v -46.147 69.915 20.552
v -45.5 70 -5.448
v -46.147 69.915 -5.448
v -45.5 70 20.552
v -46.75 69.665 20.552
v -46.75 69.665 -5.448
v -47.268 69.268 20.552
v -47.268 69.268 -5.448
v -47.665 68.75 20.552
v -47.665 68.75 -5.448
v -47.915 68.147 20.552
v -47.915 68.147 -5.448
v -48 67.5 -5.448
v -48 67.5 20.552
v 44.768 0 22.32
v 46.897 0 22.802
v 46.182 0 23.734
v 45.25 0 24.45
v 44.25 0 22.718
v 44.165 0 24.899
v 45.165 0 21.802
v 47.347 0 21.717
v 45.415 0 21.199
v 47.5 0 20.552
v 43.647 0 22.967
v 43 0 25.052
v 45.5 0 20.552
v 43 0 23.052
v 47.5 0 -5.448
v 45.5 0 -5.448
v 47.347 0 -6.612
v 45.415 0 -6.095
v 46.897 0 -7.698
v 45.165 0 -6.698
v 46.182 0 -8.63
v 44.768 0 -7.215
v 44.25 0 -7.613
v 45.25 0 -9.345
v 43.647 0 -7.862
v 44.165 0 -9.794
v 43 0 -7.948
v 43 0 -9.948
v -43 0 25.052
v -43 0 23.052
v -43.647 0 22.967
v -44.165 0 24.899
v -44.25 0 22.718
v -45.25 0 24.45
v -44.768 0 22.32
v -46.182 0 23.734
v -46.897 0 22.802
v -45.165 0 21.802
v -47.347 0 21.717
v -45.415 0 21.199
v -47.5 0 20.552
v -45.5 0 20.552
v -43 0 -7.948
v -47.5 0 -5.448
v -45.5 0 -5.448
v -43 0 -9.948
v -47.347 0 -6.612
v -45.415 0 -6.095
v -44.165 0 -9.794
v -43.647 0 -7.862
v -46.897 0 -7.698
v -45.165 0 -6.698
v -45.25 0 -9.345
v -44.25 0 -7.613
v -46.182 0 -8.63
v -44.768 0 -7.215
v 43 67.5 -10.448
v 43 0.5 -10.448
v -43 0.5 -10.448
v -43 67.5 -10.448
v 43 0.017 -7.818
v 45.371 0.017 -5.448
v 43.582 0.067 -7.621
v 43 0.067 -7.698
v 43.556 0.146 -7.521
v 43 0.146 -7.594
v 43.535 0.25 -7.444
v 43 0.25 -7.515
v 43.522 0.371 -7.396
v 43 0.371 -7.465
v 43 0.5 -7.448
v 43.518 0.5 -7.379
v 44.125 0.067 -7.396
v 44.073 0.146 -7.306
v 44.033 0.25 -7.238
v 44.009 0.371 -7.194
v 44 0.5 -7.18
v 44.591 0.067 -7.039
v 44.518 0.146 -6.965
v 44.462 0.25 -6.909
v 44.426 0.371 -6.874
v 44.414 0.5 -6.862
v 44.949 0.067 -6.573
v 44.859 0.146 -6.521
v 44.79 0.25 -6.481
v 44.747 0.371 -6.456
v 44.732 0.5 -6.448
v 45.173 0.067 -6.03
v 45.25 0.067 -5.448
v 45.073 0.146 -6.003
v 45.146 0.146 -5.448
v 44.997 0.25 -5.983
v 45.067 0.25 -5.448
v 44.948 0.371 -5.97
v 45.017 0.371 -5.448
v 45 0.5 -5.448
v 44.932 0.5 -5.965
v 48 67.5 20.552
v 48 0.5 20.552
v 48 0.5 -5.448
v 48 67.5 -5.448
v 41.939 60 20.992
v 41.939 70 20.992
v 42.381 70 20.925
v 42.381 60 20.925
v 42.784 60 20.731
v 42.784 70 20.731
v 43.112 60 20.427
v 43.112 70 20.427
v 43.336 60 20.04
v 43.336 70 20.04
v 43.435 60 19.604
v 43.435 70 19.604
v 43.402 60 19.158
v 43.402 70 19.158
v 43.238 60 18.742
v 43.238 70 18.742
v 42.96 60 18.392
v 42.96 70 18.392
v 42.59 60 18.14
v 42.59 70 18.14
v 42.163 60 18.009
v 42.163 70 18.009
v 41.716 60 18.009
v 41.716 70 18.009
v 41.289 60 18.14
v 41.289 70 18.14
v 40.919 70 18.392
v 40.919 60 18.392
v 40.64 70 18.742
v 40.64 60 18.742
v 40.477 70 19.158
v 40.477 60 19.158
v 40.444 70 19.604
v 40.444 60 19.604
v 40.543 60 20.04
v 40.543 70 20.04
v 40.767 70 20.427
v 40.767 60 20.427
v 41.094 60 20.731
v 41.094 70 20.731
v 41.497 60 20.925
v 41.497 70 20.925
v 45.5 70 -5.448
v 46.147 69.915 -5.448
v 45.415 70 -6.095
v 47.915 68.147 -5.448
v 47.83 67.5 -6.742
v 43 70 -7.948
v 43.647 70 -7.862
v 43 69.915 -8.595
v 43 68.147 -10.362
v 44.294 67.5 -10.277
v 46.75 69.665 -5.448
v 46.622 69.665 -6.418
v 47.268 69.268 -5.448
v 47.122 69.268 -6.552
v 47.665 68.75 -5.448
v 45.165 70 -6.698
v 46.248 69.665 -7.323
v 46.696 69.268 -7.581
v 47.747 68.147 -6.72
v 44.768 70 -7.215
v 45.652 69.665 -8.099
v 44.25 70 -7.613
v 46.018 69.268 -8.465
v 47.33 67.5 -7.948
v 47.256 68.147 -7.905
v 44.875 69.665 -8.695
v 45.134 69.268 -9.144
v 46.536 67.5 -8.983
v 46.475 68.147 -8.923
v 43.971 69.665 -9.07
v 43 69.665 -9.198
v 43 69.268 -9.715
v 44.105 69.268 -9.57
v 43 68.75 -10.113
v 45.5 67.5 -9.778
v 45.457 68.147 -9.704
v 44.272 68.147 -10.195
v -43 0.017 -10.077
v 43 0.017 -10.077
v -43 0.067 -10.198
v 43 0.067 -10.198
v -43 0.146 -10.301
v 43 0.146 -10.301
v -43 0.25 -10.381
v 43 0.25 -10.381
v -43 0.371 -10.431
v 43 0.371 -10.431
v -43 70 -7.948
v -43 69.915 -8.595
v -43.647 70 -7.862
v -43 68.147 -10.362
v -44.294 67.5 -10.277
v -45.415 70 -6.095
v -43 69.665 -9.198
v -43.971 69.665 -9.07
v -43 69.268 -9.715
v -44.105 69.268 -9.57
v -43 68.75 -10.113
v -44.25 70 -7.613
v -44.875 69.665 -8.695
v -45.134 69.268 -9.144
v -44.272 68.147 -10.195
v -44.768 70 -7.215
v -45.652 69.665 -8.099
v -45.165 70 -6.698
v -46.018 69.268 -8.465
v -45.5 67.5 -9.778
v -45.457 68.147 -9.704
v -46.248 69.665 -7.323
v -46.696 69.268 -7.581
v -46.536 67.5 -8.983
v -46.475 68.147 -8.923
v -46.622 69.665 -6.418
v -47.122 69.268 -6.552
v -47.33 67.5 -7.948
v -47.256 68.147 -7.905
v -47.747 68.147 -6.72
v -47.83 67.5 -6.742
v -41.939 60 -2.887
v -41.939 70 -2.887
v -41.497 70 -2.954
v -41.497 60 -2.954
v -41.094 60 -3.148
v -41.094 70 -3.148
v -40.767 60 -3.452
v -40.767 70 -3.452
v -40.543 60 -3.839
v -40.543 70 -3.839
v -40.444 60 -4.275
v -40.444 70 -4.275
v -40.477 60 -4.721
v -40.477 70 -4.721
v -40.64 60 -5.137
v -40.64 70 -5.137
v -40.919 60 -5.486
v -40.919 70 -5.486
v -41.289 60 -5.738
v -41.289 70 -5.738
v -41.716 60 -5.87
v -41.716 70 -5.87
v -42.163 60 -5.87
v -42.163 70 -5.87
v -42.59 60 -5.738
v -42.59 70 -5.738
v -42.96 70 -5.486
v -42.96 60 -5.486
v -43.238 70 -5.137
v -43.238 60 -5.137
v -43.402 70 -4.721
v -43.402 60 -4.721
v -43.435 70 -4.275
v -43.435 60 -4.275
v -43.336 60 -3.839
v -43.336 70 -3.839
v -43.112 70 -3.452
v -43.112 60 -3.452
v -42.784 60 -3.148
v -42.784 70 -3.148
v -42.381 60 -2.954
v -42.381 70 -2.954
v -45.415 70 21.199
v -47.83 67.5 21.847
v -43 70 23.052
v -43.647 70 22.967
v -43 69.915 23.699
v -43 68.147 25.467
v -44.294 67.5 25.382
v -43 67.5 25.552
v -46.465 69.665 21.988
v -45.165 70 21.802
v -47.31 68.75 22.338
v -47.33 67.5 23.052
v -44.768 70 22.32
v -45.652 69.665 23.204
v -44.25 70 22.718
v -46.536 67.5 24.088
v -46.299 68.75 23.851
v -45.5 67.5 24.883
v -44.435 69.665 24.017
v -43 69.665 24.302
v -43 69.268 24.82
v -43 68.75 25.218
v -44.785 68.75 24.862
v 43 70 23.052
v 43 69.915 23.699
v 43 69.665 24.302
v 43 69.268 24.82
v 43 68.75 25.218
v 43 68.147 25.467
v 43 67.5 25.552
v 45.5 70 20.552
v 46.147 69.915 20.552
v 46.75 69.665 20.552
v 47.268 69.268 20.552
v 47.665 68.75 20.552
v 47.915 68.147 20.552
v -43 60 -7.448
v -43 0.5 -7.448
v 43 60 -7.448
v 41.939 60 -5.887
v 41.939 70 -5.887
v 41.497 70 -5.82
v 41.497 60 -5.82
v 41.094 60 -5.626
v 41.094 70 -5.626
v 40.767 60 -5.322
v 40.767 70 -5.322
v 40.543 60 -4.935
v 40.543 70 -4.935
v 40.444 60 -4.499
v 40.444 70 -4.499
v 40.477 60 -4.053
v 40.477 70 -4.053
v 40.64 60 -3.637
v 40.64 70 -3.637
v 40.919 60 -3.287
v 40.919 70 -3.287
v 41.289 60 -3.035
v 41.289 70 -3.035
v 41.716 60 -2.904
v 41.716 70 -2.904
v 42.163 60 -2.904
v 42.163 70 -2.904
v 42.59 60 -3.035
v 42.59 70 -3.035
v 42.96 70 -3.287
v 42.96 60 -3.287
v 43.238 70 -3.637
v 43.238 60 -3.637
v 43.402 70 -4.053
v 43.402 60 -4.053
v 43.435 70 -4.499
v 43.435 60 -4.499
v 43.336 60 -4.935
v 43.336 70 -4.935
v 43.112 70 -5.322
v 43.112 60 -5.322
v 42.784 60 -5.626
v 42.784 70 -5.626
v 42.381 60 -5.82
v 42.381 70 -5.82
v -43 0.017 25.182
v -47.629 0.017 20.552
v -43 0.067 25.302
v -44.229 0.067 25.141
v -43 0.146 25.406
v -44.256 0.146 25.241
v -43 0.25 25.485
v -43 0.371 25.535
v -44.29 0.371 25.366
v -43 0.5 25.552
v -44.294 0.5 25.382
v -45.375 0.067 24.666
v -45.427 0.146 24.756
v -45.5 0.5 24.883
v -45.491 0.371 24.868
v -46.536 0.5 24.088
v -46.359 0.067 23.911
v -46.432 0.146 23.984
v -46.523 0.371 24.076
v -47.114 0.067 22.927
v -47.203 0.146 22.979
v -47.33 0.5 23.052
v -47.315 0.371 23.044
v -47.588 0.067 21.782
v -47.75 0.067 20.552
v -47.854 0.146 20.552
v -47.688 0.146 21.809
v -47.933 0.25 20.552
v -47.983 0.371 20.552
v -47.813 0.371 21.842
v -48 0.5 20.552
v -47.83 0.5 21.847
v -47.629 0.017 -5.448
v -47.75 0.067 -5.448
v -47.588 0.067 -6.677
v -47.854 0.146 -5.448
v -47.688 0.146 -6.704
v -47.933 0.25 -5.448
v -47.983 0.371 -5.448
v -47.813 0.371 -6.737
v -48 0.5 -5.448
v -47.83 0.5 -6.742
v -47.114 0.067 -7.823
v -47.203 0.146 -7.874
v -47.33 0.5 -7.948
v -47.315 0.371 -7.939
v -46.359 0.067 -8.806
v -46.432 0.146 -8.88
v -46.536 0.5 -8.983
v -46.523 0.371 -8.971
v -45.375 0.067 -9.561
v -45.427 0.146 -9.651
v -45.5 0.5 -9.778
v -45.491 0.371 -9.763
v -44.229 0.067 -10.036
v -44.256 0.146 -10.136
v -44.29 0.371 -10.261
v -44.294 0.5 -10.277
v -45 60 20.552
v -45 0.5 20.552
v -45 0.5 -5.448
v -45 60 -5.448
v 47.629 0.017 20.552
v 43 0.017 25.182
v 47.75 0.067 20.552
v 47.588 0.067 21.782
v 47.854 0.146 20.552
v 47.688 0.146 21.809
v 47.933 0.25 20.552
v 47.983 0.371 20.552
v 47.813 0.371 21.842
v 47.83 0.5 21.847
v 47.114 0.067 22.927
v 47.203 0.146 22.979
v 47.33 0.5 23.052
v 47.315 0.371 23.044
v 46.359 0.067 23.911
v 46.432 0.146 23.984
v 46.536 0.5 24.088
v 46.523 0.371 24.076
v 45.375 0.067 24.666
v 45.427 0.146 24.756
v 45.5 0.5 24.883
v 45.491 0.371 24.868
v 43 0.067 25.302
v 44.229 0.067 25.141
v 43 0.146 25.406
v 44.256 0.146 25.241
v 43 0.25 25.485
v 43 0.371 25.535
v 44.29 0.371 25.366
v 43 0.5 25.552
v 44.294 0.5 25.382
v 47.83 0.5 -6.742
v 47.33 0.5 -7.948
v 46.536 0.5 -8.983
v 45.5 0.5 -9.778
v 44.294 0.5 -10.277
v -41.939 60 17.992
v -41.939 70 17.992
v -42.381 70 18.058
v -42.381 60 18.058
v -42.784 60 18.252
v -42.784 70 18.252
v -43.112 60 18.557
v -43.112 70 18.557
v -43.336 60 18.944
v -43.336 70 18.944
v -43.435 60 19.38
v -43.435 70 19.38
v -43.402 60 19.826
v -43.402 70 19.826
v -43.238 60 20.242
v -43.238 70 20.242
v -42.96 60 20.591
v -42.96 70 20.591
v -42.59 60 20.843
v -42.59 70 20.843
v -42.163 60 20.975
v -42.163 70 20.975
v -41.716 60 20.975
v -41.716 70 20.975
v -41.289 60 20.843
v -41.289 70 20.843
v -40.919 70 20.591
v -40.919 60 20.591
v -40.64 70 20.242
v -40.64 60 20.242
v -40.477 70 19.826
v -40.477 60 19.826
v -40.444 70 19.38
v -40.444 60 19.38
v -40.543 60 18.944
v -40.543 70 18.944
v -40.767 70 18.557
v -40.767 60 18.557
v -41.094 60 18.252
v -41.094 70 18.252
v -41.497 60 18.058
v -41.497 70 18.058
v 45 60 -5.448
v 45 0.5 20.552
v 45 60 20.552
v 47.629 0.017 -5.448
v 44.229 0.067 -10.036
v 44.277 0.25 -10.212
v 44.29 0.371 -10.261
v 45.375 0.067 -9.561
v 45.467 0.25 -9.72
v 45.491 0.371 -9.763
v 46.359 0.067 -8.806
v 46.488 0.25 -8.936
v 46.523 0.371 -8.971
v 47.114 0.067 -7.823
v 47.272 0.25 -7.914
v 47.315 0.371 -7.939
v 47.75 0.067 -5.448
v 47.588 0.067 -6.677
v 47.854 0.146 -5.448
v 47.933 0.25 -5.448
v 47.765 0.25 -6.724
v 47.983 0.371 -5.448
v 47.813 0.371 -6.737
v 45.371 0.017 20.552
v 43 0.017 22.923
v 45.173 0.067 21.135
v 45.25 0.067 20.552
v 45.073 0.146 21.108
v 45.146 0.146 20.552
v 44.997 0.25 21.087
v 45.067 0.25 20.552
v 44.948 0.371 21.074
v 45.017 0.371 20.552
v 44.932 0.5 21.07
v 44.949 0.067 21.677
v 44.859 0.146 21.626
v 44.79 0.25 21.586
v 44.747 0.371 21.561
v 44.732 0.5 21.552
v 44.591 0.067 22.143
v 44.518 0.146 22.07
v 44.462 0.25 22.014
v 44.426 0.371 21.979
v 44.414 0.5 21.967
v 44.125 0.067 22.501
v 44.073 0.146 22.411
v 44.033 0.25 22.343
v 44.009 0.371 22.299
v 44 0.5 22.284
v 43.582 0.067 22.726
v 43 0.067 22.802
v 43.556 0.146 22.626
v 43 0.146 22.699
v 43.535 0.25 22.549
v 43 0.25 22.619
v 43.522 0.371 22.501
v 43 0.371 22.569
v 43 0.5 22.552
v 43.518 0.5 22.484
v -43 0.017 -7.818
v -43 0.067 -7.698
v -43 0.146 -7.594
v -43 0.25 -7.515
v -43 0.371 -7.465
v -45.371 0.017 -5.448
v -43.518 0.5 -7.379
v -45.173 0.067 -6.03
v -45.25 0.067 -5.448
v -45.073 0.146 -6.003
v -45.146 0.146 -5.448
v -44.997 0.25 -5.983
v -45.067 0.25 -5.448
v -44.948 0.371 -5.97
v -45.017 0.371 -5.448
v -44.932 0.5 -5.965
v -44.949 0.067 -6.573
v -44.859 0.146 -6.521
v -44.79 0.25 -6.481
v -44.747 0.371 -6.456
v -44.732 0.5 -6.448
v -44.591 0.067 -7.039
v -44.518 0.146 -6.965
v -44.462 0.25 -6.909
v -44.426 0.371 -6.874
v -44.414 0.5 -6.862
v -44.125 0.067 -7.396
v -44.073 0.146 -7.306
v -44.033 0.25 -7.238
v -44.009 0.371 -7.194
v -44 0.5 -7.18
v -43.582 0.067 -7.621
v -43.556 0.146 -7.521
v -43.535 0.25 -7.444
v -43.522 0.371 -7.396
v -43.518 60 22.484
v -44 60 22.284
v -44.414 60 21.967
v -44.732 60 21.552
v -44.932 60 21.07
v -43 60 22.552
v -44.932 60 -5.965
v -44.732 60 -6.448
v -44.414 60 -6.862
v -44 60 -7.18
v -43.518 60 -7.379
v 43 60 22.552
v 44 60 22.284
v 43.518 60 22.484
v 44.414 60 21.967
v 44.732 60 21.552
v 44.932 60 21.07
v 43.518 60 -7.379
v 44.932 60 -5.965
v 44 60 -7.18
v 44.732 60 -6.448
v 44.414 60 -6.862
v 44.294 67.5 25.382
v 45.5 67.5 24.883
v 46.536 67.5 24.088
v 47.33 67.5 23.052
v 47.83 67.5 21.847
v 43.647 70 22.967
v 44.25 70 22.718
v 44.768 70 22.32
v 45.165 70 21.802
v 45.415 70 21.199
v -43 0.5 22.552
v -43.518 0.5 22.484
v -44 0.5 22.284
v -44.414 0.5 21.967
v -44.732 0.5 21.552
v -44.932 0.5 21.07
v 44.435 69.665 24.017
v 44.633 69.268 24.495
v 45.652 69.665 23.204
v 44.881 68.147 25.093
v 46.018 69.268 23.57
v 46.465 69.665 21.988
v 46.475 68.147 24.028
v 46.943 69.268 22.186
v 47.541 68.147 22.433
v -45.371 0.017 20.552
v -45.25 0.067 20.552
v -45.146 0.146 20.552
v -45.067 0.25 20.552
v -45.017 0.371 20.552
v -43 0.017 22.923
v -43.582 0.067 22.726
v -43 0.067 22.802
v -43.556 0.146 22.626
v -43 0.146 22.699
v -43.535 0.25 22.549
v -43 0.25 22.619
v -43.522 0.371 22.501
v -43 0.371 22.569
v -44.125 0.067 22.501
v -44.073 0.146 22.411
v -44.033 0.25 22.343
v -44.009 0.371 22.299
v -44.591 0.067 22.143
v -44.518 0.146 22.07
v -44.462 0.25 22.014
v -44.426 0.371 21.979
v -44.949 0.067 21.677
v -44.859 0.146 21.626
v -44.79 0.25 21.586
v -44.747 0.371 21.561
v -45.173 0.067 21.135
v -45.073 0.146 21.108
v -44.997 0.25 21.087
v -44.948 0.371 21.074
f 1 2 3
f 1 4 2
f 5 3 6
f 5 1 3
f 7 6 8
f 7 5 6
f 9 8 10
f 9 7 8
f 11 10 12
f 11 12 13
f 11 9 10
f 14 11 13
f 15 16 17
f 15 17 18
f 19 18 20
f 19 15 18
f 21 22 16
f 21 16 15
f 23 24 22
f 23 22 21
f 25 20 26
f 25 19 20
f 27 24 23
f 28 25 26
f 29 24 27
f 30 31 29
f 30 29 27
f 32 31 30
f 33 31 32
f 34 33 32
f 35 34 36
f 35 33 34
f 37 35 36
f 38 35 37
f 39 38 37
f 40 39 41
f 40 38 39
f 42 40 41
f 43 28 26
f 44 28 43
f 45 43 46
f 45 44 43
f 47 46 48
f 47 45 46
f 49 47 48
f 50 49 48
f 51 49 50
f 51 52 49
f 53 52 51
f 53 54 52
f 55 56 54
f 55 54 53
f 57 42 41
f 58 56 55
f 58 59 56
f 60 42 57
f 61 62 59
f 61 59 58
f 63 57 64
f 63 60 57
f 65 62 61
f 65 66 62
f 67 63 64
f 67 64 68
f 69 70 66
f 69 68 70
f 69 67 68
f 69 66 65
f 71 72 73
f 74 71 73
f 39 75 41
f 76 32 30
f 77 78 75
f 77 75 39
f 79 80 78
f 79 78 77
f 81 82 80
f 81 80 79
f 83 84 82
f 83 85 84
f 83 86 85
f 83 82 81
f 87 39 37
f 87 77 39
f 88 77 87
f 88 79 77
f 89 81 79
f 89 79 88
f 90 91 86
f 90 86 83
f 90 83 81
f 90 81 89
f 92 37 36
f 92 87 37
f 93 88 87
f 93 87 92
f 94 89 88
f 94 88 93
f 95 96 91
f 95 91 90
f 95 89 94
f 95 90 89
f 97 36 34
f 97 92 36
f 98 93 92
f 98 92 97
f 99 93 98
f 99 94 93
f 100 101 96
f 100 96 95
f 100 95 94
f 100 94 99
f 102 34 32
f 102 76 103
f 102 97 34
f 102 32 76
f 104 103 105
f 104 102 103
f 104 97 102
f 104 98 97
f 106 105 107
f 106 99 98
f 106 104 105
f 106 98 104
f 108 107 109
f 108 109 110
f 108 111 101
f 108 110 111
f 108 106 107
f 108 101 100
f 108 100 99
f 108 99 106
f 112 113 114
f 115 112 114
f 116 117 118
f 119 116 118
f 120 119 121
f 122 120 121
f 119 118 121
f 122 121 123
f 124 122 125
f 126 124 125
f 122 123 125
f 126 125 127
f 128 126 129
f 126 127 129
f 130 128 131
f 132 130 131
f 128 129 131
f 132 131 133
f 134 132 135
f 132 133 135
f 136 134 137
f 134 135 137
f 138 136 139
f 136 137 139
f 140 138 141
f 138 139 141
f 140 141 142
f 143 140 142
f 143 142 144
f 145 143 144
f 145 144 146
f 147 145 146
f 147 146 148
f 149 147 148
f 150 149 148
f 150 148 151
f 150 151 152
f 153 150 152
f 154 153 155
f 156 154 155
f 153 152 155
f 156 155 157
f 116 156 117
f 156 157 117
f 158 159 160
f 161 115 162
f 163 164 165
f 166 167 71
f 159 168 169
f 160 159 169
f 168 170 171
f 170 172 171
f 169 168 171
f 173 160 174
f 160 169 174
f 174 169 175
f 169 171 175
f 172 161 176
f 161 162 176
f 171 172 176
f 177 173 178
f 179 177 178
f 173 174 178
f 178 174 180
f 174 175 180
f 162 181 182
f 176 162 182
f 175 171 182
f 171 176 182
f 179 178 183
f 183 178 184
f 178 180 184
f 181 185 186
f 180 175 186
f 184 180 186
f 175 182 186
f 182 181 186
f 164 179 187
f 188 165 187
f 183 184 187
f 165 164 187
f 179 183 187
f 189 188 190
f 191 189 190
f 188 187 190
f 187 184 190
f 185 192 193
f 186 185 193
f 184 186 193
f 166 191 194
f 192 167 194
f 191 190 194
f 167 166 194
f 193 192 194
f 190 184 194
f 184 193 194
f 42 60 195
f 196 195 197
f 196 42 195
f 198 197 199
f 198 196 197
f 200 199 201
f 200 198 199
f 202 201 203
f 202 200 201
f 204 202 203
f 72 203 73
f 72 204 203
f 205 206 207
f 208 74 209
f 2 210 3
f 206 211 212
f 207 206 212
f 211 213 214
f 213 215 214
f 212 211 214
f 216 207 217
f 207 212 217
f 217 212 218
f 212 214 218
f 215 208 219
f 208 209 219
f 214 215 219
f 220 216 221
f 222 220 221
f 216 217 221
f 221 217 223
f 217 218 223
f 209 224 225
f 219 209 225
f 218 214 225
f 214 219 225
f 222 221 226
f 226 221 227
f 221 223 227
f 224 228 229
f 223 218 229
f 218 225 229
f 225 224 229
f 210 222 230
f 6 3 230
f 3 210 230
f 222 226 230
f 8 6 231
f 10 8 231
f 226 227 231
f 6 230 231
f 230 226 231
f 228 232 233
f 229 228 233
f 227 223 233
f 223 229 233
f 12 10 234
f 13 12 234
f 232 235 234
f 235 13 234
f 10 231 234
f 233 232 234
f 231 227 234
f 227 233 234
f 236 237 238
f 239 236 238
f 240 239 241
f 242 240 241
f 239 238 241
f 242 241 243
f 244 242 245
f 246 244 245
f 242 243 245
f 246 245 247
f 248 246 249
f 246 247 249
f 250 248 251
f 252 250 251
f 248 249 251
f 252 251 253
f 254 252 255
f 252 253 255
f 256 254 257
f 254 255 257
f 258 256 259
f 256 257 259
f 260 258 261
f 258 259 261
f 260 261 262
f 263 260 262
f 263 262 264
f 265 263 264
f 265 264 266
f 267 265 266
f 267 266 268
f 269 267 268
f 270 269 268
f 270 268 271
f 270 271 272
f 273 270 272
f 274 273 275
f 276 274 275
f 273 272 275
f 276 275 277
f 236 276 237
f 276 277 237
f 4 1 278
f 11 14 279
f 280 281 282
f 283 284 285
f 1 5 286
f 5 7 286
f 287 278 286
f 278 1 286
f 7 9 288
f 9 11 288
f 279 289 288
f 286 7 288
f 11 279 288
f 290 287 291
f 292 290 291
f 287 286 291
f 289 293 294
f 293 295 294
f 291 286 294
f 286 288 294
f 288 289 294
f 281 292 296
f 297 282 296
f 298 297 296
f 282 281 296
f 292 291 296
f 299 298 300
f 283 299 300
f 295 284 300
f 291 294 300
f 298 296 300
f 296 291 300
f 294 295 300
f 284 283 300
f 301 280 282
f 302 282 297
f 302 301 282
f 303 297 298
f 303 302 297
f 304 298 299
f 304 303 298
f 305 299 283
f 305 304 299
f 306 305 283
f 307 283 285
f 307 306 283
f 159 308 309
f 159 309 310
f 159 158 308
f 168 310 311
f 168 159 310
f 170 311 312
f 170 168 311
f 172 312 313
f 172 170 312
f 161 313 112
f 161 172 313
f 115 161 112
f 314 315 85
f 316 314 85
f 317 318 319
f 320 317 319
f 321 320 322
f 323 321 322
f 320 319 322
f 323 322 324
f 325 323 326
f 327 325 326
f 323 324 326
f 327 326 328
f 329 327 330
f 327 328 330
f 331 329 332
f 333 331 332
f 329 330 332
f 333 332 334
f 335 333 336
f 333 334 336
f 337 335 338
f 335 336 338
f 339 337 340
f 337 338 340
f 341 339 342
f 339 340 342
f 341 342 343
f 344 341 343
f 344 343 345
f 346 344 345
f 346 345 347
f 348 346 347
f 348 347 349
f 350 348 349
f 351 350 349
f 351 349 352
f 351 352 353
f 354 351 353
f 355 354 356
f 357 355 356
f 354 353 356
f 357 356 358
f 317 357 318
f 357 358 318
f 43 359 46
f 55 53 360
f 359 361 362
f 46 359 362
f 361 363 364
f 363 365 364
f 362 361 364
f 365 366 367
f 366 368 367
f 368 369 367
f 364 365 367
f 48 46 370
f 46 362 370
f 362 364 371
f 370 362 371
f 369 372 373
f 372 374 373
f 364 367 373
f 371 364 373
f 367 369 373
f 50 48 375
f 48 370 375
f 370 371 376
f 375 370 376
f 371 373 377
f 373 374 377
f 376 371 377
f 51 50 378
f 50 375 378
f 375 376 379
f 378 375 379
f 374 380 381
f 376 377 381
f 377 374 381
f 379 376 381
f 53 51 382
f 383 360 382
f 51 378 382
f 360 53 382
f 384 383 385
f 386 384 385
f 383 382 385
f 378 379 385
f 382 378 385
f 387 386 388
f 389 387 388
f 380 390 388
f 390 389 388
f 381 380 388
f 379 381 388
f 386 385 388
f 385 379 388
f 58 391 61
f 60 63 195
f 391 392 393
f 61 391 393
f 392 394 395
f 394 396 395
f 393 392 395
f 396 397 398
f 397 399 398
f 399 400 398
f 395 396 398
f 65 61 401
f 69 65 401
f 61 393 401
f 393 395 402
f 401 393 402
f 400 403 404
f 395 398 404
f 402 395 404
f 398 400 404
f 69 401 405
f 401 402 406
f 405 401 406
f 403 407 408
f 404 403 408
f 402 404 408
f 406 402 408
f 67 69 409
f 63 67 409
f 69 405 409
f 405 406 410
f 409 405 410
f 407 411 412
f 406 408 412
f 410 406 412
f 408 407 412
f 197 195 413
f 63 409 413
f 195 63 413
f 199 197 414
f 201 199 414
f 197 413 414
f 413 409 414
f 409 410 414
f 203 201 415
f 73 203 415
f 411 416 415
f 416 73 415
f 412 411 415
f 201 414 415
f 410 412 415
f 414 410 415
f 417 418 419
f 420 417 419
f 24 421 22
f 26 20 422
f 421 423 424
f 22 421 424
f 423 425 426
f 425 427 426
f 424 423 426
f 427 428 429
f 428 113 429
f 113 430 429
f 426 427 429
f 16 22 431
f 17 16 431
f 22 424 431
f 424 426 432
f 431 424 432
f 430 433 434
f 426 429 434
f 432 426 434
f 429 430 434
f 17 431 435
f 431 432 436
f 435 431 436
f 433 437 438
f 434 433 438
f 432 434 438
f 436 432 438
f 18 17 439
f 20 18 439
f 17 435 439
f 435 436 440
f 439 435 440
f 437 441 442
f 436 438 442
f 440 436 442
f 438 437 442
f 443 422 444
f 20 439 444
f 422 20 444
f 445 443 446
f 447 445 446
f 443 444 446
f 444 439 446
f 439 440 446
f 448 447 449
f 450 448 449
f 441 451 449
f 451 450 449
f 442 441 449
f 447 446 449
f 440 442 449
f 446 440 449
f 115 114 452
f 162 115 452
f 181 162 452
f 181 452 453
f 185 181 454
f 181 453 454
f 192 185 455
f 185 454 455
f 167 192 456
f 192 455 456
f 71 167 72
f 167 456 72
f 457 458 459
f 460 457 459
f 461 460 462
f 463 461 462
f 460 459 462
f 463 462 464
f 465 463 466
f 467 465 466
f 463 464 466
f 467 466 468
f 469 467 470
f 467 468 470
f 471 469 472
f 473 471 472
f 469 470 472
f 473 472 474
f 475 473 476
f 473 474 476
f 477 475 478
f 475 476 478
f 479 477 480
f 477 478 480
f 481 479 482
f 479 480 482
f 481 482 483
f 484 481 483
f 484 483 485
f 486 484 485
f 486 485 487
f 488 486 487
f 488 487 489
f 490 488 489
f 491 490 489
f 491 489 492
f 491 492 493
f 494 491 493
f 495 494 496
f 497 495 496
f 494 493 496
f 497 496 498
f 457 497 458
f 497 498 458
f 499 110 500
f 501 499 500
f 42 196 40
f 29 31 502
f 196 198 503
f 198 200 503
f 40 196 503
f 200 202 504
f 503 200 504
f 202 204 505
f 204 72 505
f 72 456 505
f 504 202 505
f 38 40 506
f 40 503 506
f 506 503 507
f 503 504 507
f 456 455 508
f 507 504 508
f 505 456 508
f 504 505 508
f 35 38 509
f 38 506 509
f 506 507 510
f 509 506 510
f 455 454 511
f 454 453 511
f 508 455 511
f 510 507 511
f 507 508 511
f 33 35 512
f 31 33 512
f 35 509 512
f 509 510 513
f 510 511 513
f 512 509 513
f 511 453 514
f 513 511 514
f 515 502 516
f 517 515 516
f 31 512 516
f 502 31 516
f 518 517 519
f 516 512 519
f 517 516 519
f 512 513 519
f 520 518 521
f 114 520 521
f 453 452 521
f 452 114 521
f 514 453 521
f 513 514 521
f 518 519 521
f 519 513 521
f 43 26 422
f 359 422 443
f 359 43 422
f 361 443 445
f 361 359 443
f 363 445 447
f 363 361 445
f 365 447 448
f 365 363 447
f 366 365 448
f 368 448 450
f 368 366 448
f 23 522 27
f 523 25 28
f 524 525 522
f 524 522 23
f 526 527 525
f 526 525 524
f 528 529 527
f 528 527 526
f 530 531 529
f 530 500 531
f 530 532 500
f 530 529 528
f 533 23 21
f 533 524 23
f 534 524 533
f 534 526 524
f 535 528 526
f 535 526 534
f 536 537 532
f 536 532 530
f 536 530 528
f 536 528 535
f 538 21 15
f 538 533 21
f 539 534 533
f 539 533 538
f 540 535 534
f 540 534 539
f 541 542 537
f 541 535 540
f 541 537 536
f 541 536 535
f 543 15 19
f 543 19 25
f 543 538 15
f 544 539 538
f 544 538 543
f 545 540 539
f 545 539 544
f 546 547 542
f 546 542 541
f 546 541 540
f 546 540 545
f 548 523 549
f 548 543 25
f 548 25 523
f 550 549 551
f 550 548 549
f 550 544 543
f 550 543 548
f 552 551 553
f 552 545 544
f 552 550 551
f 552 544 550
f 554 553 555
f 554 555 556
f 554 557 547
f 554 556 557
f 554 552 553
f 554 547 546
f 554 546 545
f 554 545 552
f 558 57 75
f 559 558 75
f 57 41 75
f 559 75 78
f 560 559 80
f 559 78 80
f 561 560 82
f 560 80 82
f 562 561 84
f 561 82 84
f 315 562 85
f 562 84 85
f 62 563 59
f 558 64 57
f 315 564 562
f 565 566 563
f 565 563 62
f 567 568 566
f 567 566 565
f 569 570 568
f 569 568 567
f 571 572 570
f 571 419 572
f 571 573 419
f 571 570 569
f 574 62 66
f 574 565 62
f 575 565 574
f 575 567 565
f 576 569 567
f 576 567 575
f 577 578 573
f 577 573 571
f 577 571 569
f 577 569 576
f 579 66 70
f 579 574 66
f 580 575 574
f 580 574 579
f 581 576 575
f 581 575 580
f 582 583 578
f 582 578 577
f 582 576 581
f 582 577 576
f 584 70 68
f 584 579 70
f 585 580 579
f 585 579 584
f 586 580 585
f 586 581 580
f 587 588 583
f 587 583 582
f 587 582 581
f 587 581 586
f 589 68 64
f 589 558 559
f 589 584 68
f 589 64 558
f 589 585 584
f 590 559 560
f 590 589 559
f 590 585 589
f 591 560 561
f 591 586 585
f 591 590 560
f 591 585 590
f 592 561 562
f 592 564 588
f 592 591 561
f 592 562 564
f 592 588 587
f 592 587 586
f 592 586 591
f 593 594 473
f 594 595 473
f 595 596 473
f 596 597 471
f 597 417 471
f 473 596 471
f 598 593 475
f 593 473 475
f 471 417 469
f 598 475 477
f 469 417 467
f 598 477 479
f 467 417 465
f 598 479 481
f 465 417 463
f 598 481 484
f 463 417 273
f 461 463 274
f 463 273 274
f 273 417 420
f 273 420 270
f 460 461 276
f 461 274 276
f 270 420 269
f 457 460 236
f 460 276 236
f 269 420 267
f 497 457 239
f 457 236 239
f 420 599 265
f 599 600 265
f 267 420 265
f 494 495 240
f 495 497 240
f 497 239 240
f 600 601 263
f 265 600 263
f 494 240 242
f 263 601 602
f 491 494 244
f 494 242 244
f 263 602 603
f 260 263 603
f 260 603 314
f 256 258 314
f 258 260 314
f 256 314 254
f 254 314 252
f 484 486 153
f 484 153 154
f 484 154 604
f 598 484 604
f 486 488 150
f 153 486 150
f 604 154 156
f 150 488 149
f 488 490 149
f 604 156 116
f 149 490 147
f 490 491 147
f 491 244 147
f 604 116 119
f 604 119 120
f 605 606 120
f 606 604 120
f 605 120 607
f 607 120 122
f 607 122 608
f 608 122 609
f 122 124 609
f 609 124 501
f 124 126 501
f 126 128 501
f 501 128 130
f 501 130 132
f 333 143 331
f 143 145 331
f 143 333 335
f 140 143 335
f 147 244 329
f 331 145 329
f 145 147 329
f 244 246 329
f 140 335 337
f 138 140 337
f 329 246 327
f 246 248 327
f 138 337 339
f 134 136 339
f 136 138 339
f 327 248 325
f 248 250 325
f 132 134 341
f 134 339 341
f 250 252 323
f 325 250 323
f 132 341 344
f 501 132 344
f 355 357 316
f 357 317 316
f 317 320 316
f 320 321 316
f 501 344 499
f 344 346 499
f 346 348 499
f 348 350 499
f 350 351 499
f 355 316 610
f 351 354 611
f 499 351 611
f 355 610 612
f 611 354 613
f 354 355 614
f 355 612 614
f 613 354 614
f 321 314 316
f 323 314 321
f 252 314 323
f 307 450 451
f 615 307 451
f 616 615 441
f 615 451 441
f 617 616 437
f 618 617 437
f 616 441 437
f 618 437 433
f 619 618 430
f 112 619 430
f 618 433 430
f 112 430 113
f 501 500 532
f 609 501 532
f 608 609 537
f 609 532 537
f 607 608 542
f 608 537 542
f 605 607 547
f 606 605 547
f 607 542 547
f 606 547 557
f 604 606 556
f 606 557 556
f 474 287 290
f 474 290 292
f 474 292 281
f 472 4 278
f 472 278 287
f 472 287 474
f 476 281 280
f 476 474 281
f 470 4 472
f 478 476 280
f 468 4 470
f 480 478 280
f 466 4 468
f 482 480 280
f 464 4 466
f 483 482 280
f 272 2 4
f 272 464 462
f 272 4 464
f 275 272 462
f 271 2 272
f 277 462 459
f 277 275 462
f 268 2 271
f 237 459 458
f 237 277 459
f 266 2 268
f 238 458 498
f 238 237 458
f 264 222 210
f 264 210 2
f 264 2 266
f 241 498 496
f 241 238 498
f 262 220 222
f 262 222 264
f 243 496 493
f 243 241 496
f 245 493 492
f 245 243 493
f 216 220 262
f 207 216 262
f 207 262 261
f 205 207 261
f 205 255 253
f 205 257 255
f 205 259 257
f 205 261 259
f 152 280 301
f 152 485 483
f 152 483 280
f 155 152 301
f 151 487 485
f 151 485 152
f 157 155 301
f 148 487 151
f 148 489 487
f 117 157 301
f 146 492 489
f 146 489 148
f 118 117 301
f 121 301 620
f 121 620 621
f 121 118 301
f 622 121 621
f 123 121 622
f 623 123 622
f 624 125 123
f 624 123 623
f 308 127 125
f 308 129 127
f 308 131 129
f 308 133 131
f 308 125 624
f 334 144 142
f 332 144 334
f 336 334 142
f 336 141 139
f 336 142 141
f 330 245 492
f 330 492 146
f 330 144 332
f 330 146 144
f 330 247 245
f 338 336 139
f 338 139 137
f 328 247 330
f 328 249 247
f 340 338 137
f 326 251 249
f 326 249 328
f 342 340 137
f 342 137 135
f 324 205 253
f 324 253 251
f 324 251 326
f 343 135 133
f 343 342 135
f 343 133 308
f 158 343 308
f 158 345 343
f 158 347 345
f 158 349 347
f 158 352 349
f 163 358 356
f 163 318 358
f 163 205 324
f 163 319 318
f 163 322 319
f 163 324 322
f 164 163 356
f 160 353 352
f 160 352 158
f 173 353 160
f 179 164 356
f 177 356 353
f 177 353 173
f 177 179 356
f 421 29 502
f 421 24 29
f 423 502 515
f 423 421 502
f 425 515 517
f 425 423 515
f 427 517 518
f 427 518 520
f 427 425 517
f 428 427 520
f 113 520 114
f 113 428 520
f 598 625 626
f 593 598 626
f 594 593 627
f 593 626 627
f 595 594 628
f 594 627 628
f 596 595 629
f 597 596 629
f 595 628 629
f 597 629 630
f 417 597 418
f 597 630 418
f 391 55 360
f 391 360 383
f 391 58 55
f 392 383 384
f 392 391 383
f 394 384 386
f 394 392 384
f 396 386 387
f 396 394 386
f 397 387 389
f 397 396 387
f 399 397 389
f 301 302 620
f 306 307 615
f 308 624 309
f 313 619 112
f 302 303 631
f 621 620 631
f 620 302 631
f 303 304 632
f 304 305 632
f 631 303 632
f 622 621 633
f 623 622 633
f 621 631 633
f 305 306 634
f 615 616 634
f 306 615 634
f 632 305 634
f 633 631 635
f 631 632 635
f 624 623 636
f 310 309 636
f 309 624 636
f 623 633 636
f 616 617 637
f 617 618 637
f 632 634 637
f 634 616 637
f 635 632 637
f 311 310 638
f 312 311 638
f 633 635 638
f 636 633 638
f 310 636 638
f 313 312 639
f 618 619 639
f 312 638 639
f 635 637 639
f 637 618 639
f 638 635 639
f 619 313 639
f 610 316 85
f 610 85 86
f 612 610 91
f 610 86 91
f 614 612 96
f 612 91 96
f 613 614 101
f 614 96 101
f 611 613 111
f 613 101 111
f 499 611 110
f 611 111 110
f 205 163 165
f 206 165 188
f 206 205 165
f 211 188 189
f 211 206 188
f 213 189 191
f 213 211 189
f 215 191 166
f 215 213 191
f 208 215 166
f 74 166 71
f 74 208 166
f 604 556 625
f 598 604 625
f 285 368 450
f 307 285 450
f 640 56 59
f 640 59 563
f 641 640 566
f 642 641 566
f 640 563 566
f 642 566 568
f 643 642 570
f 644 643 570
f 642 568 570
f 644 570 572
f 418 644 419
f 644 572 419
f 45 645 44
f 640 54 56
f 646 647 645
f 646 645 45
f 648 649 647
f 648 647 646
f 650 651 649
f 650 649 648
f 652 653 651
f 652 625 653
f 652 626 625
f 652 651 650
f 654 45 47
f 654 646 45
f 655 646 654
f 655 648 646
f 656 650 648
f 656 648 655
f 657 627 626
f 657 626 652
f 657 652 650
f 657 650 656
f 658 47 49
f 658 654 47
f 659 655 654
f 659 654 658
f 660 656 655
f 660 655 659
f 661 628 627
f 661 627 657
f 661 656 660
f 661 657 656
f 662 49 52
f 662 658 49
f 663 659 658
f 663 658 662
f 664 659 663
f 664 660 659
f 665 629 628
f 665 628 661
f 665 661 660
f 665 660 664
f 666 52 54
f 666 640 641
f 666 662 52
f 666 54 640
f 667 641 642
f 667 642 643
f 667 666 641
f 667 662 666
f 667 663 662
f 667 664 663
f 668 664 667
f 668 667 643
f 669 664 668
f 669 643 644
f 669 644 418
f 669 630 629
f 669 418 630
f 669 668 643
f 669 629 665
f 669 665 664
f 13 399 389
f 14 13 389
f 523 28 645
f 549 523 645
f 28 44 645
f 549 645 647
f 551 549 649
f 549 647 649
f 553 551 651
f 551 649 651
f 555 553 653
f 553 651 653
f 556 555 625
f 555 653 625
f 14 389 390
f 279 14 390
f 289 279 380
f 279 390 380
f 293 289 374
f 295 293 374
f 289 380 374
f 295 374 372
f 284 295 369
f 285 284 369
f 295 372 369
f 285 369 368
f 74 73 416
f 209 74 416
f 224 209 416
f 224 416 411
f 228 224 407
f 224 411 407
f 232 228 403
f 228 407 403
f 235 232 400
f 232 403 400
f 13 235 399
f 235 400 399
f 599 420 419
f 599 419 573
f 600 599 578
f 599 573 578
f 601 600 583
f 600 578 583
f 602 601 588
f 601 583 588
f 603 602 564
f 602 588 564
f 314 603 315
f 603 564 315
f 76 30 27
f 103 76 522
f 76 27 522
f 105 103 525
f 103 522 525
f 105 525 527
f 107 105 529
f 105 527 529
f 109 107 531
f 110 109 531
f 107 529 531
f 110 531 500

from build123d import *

# Parameters (mm, degrees)
BOSS_EXTRUDE1_DEPTH = 60
BOSS_EXTRUDE2_DEPTH = 10
FILLET1_R           = 2.5
FILLET2_R           = 0.5
SKETCH7_R           = 1.5
CUT_EXTRUDE1_DEPTH  = 10


with BuildPart() as part:
    # Sketch1 → Boss-Extrude1 (new body)
    with BuildSketch(Plane(origin=(0, 0, 0), x_dir=(1, 0, 0), z_dir=(0, 1, 0))):
        with BuildLine():
            Line((-43, 10.447552448), (43, 10.447552448))
            ThreePointArc((43, 10.447552448), (46.535533906, 8.983086353), (48, 5.447552448))
            Line((48, 5.447552448), (48, -20.552447552))
            ThreePointArc((48, -20.552447552), (46.535533906, -24.087981458), (43, -25.552447552))
            Line((43, -25.552447552), (-43, -25.552447552))
            ThreePointArc((-43, -25.552447552), (-46.535533906, -24.087981458), (-48, -20.552447552))
            Line((-48, -20.552447552), (-48, 5.447552448))
            ThreePointArc((-48, 5.447552448), (-46.535533906, 8.983086353), (-43, 10.447552448))
        make_face()
        with BuildLine():
            Line((-43, 7.447552448), (43, 7.447552448))
            ThreePointArc((43, 7.447552448), (44.414213562, 6.86176601), (45, 5.447552448))
            Line((45, 5.447552448), (45, -20.552447552))
            ThreePointArc((45, -20.552447552), (44.414213562, -21.966661115), (43, -22.552447552))
            Line((43, -22.552447552), (-43, -22.552447552))
            ThreePointArc((-43, -22.552447552), (-44.414213562, -21.966661115), (-45, -20.552447552))
            Line((-45, -20.552447552), (-45, 5.447552448))
            ThreePointArc((-45, 5.447552448), (-44.414213562, 6.86176601), (-43, 7.447552448))
        make_face(mode=Mode.SUBTRACT)
    extrude(amount=BOSS_EXTRUDE1_DEPTH)

    # Sketch2 → Boss-Extrude2 (add)
    with BuildSketch(Plane(origin=(0, 60, 0), x_dir=(1, 0, 0), z_dir=(0, 1, 0))):
        with BuildLine():
            Line((-43, -25.552447552), (43, -25.552447552))
            ThreePointArc((43, -25.552447552), (46.535533906, -24.087981458), (48, -20.552447552))
            Line((48, -20.552447552), (48, 5.447552448))
            ThreePointArc((48, 5.447552448), (46.535533906, 8.983086353), (43, 10.447552448))
            Line((43, 10.447552448), (-43, 10.447552448))
            ThreePointArc((-43, 10.447552448), (-46.535533906, 8.983086353), (-48, 5.447552448))
            Line((-48, 5.447552448), (-48, -20.552447552))
            ThreePointArc((-48, -20.552447552), (-46.535533906, -24.087981458), (-43, -25.552447552))
        make_face()
    extrude(amount=BOSS_EXTRUDE2_DEPTH)

    # Fillet1
    fillet1_edges = [part.edges().sort_by_distance(p)[0] for p in [
        (46.535533906, 70, 24.087981458),
        (48, 70, 7.552447552),
        (46.535533906, 70, -8.983086353),
        (-46.535533906, 70, -8.983086353),
        (0, 70, -10.447552448),
        (-48, 70, 7.552447552),
        (-46.535533906, 70, 24.087981458),
        (0, 70, 25.552447552),
    ]]
    fillet(fillet1_edges, radius=FILLET1_R)

    # Fillet2
    fillet2_edges = [part.edges().sort_by_distance(p)[0] for p in [
        (0, 0, -7.447552448),
        (44.414213562, 0, -6.86176601),
        (45, 0, 7.552447552),
        (44.414213562, 0, 21.966661115),
        (0, 0, 22.552447552),
        (-44.414213562, 0, 21.966661115),
        (-45, 0, 7.552447552),
        (-44.414213562, 0, -6.86176601),
        (0, 0, 25.552447552),
        (46.535533906, 0, 24.087981458),
        (48, 0, 7.552447552),
        (46.535533906, 0, -8.983086353),
        (0, 0, -10.447552448),
        (-46.535533906, 0, -8.983086353),
        (-48, 0, 7.552447552),
        (-46.535533906, 0, 24.087981458),
    ]]
    fillet(fillet2_edges, radius=FILLET2_R)

    # Sketch7 → Cut-Extrude1 (cut)
    with BuildSketch(Plane(origin=(0, 70, 0), x_dir=(1, 0, 0), z_dir=(0, 1, 0))):
        with Locations((-41.939339828, 4.386892276)):
            Circle(SKETCH7_R)
        with Locations((-41.939339828, -19.491787381)):
            Circle(SKETCH7_R)
        with Locations((41.939339828, -19.491787381)):
            Circle(SKETCH7_R)
        with Locations((41.939339828, 4.386892276)):
            Circle(SKETCH7_R)
    extrude(amount=-CUT_EXTRUDE1_DEPTH, mode=Mode.SUBTRACT)


solid = part.part
